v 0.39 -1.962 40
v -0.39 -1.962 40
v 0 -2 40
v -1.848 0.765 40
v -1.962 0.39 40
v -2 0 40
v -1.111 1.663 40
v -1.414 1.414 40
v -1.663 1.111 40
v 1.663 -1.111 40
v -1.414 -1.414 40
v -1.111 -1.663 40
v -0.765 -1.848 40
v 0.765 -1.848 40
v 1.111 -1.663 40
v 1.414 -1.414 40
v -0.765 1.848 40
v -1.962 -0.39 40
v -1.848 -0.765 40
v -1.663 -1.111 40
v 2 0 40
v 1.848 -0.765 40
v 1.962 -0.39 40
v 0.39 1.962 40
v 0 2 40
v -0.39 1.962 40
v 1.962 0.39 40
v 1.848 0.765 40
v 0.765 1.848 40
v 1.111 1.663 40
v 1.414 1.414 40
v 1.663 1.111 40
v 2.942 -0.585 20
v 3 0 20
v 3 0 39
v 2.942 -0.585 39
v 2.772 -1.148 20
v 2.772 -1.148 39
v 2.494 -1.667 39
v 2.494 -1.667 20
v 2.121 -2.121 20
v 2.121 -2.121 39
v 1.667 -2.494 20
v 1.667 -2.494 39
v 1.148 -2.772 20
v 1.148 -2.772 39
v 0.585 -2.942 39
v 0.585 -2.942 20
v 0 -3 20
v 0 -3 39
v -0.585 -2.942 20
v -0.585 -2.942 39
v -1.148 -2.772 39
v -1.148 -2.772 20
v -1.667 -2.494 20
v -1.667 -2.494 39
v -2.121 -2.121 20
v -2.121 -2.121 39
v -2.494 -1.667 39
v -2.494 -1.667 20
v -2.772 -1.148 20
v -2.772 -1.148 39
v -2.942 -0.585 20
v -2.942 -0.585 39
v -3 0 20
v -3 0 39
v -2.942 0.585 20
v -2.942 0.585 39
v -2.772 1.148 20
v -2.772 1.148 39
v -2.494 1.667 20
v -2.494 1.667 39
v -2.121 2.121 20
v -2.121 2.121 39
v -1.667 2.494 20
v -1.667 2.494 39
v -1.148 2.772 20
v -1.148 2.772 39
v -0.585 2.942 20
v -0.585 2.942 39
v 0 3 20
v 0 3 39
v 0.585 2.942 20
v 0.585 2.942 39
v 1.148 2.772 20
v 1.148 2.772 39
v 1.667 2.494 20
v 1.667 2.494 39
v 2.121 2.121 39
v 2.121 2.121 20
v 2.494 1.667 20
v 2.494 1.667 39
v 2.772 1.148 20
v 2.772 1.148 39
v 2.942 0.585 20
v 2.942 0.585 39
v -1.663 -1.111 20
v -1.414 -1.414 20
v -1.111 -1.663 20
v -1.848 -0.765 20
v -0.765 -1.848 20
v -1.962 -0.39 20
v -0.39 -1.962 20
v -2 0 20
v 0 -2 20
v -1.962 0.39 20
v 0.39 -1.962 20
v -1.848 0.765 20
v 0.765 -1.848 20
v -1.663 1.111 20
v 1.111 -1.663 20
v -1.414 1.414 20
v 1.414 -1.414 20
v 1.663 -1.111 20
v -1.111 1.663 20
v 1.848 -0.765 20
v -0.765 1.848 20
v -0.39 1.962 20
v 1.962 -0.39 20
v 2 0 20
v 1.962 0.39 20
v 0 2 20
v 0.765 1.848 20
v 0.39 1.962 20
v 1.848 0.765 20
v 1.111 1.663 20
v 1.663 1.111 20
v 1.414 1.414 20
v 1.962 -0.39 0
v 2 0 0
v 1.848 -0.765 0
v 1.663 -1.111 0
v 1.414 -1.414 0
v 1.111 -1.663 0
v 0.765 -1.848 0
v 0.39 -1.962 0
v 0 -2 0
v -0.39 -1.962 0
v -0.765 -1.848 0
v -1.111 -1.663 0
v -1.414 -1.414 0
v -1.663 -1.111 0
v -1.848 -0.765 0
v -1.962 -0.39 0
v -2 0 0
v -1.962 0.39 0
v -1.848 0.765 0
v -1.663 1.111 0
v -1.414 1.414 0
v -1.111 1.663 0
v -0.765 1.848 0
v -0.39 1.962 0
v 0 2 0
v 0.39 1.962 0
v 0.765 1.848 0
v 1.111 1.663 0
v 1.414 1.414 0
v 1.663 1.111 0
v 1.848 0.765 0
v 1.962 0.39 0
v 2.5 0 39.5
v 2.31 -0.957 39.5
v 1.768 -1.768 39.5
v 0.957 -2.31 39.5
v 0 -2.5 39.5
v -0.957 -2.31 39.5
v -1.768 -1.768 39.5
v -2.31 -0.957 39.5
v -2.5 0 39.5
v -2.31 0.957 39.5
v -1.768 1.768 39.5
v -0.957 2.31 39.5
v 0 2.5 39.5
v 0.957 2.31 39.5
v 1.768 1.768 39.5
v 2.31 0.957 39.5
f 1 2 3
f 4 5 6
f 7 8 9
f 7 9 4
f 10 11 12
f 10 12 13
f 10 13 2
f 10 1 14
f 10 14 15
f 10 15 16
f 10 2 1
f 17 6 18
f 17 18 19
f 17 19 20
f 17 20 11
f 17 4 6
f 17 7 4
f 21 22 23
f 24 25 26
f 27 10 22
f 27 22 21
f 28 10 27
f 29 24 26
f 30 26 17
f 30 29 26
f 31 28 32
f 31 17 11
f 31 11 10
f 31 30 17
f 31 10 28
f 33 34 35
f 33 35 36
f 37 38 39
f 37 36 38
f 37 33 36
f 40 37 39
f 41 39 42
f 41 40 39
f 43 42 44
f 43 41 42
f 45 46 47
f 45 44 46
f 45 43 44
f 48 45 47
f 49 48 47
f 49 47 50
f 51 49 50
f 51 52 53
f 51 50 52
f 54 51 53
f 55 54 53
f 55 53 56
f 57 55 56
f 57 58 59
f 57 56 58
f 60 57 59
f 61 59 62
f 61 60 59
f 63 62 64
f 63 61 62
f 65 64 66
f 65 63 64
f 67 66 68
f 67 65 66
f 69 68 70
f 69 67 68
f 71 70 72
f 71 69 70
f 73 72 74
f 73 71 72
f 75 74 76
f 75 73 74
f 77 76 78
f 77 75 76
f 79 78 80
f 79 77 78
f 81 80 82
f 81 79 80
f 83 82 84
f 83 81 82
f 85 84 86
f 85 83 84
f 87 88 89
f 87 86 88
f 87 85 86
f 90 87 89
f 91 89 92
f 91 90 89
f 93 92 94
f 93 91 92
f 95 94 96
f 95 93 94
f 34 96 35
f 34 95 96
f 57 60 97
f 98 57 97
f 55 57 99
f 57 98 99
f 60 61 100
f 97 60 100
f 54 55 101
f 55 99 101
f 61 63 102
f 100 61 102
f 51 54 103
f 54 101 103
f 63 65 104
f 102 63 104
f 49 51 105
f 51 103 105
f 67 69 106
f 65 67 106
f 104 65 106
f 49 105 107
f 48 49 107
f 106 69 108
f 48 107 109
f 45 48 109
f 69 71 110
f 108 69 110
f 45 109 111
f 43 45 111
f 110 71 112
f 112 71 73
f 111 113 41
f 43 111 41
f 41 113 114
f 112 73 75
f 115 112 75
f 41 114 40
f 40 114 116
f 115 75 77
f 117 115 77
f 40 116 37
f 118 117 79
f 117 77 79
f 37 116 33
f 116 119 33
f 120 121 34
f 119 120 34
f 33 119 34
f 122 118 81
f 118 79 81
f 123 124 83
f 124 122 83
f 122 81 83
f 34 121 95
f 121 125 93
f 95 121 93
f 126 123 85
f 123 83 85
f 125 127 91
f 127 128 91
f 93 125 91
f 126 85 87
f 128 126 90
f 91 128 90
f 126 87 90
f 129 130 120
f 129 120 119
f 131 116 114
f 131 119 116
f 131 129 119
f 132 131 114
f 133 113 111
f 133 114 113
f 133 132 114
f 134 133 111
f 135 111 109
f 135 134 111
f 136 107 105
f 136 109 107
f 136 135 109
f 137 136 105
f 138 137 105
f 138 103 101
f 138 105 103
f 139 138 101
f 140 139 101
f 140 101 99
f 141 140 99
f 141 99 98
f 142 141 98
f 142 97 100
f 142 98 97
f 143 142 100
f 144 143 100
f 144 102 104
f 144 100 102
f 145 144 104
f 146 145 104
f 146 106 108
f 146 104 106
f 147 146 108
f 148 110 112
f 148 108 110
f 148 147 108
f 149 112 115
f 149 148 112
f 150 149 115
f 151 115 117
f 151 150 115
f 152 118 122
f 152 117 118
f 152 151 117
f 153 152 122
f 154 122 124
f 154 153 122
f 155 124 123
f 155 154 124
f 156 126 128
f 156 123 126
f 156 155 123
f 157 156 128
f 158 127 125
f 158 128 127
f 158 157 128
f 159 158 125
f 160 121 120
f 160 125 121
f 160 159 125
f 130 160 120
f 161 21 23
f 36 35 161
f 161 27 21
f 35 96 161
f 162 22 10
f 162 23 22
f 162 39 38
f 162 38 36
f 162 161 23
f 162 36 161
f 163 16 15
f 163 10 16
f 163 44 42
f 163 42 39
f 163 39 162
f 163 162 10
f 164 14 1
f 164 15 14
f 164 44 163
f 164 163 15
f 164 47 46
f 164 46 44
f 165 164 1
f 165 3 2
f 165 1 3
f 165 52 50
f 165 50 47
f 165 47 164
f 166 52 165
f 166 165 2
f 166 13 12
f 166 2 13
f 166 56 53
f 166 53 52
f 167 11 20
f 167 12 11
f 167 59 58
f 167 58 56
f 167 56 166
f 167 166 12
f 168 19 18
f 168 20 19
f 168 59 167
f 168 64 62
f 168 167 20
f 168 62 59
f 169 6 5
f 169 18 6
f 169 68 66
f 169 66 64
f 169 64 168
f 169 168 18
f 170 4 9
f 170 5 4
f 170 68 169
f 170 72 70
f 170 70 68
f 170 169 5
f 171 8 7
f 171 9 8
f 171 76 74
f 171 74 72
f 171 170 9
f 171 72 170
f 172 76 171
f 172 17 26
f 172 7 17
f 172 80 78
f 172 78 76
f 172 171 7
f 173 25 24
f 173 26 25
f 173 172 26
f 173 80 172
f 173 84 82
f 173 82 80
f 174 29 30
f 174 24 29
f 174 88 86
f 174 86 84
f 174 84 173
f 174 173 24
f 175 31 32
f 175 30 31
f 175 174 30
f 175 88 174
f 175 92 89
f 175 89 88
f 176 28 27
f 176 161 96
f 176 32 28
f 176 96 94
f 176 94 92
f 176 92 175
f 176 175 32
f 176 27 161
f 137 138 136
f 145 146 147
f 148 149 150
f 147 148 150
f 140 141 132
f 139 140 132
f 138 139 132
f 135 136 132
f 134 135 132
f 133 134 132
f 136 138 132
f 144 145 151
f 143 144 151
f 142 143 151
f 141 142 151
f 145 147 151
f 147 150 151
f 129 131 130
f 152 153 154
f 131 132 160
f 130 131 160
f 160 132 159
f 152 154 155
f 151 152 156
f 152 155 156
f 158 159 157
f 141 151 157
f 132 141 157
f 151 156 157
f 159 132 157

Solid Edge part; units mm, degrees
sketch "Sketch1" plane through (0, 0, 0) normal (0, 0, 1) x (1, 0, 0)
  circle A0 centre (0, 0) radius 2
extrude "Protrusion1" add sketch "Sketch1" along normal blind 20
sketch "Sketch2" plane through (0, 0, 20) normal (0, 0, 1) x (1, 0, 0)
  circle A0 centre (0, 0) radius 3
extrude "Top" add sketch "Sketch2" along normal blind 20
chamfer "Chamfer___Top" distance 1 angle 45 1 edges at (-3, 0, 40)
cosmetic_thread "Thread1" size "M4"
properties material "Stainless Steel, 420"
